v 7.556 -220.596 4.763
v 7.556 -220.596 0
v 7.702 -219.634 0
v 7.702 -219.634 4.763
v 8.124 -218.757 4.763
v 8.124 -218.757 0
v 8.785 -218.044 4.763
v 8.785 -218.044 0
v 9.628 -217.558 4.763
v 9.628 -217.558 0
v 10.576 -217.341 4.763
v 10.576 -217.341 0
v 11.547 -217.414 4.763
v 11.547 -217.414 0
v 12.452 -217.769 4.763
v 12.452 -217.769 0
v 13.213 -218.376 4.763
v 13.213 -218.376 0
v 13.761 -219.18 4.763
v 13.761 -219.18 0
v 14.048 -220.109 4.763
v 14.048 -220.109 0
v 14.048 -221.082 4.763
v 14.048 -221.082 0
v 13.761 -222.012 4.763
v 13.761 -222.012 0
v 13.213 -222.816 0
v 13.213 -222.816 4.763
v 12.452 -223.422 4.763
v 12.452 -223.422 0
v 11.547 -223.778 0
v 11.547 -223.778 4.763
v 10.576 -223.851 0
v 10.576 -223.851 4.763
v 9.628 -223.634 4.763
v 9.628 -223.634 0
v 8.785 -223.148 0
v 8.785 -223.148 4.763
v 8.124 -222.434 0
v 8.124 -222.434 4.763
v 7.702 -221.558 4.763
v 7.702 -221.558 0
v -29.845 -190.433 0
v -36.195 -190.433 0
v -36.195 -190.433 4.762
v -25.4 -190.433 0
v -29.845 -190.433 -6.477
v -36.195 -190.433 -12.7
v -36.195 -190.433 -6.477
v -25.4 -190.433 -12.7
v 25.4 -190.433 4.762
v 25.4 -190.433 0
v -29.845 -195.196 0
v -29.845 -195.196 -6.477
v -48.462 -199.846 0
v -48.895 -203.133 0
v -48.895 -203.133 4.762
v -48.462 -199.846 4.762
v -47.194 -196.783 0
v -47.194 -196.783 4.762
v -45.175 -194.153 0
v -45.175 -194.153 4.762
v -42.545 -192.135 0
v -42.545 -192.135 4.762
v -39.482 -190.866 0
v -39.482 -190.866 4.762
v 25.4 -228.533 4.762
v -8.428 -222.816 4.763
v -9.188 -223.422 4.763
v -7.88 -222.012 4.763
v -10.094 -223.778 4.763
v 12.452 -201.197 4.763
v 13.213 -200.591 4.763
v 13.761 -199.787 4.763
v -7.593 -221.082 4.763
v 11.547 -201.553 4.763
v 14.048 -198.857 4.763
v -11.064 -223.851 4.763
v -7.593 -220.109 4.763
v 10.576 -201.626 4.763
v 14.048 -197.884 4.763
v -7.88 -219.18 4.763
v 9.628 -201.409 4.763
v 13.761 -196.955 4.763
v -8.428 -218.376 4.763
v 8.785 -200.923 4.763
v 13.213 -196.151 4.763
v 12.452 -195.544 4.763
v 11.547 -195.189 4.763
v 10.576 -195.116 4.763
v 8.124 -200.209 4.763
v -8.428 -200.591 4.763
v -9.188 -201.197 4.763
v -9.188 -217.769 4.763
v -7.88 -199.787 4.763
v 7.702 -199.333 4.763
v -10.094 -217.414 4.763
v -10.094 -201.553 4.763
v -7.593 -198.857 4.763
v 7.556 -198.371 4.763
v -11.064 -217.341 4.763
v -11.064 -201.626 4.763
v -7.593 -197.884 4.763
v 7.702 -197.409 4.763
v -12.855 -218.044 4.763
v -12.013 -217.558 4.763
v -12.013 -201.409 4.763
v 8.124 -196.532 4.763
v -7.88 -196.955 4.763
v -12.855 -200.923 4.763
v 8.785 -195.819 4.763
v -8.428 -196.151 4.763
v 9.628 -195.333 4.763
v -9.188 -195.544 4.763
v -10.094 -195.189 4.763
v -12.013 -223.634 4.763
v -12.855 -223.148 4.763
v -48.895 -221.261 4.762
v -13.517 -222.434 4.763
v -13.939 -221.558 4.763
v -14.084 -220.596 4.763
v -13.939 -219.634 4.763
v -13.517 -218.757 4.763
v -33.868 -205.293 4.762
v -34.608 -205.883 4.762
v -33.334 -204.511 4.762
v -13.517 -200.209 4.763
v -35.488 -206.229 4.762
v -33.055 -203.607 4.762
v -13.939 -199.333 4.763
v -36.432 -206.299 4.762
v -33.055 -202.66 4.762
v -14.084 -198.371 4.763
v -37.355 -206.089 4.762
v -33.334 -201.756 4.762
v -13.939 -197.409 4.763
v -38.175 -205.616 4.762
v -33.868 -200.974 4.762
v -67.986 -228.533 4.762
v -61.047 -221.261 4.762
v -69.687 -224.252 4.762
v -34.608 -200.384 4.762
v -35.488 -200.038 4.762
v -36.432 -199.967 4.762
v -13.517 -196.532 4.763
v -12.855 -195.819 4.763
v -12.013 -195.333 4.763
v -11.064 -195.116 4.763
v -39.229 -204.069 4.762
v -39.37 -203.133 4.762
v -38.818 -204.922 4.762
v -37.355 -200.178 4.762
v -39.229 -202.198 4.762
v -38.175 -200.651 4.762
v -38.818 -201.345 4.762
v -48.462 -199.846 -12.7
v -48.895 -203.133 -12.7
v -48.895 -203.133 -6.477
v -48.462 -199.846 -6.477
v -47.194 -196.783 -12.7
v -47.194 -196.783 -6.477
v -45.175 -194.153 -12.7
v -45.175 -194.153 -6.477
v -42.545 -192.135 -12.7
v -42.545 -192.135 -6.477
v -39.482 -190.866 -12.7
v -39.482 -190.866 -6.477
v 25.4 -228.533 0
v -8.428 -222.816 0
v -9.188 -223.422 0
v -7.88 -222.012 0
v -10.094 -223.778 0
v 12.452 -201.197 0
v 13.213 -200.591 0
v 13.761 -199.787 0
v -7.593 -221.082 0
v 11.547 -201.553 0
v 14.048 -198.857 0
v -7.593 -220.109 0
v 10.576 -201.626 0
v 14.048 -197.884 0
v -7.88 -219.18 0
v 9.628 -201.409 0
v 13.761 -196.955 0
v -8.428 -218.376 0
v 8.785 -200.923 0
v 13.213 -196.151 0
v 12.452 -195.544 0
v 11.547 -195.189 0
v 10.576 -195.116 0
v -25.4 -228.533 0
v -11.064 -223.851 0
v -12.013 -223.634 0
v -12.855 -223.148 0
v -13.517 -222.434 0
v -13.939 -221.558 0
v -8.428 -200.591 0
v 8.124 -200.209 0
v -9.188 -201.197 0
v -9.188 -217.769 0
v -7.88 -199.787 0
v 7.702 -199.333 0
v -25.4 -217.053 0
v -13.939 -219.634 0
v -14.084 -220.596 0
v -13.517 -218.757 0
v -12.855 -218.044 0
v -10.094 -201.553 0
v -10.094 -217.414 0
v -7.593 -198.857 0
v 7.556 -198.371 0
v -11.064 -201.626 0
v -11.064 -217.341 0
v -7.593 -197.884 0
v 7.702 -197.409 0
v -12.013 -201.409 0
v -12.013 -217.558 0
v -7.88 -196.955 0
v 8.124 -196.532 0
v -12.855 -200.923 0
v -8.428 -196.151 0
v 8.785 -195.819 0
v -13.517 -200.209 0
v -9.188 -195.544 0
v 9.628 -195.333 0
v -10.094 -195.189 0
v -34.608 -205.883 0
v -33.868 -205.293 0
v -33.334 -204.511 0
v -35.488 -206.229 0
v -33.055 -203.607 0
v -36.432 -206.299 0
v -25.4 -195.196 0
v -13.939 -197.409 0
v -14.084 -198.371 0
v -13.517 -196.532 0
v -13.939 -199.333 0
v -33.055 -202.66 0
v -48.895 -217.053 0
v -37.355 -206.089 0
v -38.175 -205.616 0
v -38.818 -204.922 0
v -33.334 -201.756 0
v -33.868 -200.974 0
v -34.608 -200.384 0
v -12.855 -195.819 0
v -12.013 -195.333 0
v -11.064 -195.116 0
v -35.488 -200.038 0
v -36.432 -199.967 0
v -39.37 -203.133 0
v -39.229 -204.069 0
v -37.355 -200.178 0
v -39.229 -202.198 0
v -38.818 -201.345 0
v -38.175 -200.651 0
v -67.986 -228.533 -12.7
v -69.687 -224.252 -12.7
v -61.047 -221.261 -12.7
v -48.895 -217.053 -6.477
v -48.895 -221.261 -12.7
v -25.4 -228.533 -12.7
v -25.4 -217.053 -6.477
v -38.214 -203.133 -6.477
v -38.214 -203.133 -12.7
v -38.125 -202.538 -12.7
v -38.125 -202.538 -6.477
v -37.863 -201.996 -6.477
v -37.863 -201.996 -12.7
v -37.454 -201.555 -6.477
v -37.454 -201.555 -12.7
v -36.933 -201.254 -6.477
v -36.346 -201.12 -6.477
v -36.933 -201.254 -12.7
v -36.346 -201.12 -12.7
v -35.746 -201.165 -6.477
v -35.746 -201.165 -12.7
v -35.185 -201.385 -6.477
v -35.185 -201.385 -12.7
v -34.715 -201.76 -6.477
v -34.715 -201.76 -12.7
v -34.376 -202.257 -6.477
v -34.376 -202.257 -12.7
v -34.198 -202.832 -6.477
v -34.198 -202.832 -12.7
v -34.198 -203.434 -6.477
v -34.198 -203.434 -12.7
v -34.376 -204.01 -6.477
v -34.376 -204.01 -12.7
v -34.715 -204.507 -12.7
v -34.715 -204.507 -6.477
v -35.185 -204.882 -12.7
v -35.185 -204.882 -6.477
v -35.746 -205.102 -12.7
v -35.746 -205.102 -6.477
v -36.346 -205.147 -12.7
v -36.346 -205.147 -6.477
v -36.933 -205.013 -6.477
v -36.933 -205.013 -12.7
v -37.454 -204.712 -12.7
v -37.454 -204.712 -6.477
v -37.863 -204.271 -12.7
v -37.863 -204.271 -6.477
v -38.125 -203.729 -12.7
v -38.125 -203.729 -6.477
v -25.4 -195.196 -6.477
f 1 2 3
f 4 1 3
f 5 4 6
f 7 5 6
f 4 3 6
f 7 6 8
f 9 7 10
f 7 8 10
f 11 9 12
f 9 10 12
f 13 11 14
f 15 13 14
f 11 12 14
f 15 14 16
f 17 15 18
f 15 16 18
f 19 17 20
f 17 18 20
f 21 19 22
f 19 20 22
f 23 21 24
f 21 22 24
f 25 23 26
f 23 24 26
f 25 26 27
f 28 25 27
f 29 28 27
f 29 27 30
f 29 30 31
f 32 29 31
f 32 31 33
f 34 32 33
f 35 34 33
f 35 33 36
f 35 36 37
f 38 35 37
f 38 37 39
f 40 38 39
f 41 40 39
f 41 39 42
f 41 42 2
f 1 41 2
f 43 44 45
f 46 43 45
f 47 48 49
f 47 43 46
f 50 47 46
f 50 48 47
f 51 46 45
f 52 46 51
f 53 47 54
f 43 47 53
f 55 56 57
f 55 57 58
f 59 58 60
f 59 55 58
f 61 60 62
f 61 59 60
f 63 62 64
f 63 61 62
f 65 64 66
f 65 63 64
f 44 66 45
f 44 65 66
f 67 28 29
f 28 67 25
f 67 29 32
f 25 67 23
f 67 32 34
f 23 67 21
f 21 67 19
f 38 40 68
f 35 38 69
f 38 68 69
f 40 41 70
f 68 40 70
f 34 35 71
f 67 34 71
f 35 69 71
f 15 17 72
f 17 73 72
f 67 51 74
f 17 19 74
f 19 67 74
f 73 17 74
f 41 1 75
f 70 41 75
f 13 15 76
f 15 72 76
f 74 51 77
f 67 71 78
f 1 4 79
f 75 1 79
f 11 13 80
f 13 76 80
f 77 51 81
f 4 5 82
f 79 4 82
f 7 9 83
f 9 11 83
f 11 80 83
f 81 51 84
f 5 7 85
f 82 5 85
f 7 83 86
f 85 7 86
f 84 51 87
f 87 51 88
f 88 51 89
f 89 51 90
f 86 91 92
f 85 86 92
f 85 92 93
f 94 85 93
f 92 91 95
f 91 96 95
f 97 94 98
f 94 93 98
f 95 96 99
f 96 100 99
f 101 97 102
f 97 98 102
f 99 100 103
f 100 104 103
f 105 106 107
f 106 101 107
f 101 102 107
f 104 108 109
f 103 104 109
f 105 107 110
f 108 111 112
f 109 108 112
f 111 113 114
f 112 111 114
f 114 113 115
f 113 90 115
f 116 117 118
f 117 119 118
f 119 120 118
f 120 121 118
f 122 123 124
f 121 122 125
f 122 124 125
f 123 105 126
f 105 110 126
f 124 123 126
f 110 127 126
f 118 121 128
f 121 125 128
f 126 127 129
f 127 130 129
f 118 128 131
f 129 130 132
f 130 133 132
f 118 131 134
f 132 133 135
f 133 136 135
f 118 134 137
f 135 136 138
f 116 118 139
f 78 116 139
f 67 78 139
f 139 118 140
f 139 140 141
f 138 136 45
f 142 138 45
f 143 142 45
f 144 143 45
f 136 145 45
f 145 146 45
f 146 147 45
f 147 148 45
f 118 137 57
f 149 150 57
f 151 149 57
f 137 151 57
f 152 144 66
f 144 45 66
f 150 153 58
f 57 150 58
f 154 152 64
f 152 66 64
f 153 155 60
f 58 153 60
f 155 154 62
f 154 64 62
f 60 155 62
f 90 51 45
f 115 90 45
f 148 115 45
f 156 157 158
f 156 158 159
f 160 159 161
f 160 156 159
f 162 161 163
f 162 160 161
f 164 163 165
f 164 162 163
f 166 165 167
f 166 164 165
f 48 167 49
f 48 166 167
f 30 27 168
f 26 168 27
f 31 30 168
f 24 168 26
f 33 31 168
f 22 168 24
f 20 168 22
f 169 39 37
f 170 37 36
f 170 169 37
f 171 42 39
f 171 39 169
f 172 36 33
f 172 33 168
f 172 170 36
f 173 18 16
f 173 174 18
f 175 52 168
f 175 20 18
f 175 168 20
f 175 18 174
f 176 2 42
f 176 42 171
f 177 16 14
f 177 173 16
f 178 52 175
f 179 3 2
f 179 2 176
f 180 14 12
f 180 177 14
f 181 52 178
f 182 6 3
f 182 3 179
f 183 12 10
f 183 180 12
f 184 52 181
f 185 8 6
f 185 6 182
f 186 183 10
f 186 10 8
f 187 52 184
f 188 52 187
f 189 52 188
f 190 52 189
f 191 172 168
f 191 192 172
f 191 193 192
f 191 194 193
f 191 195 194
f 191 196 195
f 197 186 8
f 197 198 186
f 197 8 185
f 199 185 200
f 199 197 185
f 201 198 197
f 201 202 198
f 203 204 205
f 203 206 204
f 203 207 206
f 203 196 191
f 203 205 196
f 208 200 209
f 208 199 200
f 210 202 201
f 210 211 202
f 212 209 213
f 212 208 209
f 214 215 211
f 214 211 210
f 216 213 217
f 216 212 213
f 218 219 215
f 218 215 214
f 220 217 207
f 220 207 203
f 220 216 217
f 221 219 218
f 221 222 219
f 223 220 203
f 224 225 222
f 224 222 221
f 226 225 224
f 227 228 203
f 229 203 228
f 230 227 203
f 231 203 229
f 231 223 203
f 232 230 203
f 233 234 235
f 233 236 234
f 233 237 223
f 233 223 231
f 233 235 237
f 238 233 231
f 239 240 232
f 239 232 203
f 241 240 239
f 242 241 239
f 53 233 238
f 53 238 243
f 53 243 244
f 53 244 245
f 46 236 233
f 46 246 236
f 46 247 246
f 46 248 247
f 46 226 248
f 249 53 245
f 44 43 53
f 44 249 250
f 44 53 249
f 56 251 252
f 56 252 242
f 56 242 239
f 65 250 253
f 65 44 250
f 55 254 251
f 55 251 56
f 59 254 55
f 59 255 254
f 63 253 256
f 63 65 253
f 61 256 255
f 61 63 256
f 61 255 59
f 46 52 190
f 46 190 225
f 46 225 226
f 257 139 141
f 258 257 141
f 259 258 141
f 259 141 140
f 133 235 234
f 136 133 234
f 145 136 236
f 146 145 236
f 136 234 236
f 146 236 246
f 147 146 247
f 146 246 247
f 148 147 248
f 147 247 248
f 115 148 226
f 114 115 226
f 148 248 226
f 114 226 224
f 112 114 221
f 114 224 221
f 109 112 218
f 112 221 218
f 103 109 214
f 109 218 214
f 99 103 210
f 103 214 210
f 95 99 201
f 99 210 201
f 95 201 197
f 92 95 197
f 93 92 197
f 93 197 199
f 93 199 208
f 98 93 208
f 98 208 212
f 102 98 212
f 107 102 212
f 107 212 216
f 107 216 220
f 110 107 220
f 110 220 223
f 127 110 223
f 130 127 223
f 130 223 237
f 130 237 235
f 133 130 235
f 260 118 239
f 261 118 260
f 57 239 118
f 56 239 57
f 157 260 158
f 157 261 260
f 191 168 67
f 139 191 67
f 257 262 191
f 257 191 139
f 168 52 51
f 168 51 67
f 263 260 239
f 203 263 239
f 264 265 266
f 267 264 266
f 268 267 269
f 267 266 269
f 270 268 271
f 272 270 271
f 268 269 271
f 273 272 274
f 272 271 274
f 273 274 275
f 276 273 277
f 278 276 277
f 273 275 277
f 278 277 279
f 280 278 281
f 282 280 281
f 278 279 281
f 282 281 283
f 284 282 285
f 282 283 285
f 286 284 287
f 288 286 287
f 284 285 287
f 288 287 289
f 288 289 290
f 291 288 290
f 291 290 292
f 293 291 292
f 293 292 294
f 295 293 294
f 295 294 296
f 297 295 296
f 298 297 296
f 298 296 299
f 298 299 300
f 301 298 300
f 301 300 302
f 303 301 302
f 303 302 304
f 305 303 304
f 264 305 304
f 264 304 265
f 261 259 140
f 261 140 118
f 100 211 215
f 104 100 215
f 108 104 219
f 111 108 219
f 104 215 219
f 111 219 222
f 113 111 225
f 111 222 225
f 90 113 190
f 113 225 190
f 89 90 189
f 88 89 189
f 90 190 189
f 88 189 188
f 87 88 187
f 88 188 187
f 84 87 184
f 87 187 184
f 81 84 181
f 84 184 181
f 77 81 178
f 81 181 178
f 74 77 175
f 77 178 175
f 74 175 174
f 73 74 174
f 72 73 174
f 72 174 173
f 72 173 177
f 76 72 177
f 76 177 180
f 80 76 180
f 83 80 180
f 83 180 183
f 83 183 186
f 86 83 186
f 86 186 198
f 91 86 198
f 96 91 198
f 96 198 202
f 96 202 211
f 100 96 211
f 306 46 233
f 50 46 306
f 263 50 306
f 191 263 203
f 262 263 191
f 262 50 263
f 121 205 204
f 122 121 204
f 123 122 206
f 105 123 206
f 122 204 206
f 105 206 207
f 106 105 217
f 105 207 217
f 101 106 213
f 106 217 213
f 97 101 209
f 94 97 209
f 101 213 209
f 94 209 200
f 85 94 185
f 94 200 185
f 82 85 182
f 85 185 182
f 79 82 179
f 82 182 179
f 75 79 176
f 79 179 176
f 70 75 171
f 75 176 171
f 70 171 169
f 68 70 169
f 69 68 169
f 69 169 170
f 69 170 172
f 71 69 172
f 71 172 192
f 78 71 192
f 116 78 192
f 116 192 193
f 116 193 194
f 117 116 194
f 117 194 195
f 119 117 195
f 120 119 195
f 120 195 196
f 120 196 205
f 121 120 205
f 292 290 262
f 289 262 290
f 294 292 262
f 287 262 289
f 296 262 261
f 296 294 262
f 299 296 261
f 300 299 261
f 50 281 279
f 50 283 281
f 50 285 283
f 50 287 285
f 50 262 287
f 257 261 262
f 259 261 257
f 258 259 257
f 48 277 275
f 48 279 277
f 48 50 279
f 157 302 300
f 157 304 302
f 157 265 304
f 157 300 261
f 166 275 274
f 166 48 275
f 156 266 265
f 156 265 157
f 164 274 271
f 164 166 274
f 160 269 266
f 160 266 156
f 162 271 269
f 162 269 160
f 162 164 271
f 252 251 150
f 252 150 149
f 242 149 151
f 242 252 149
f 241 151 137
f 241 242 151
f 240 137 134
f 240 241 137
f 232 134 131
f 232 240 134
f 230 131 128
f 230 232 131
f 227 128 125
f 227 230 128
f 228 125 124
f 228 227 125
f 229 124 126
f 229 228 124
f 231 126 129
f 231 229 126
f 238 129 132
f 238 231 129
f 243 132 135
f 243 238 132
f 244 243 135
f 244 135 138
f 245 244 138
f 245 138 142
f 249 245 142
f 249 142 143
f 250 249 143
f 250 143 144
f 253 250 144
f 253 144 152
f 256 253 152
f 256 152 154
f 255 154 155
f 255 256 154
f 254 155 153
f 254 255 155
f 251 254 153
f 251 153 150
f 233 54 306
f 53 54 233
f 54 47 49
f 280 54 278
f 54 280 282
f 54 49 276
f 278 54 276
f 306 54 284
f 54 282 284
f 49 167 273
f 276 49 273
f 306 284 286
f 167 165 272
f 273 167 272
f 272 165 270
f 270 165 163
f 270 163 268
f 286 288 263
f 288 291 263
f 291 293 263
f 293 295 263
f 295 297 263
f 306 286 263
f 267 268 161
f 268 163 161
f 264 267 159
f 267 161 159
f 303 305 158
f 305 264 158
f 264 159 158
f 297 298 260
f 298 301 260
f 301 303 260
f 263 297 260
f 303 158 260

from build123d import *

# Parameters (mm, degrees)
SKETCH2_R                  = 3.175
BOSS_EXTRUDE1_DEPTH        = 4.7625
BOSS_EXTRUDE2_START        = 12.7
BOSS_EXTRUDE2_DEPTH        = 12.7
SKETCH12_W                 = 6.477
SKETCH12_H                 = 21.856650617
CUT_EXTRUDE1_DEPTH         = 24.13
SKETCH12_3_W               = 6.477
SKETCH12_3_H               = 4.7625
CUT_EXTRUDE2_DEPTH         = 19.05
TAP_DRILL_FOR_10_32_TAP1_D = 4.0386
F_1_4_CLEARANCE_HOLE1_D    = 6.5278


with BuildPart() as part:
    # Sketch2 → Boss-Extrude1 (new body)
    with BuildSketch(Plane.XY):
        with BuildLine():
            Line((-67.986186343, -228.533359856), (-69.686856366, -224.252380141))
            Line((-69.686856366, -224.252380141), (-61.0470258, -221.260552334))
            Line((-61.0470258, -221.260552334), (-48.895, -221.260552334))
            Line((-48.895, -221.260552334), (-48.895, -203.133359856))
            ThreePointArc((-48.895, -203.133359856), (-45.175256121, -194.153103735), (-36.195, -190.433359856))
            Line((-36.195, -190.433359856), (25.4, -190.433359856))
            Line((25.4, -190.433359856), (25.4, -228.533359856))
            Line((25.4, -228.533359856), (-67.986186343, -228.533359856))
        make_face()
        with Locations((-36.195, -203.133359856)):
            Circle(SKETCH2_R, mode=Mode.SUBTRACT)
    extrude(amount=BOSS_EXTRUDE1_DEPTH)

    # Sketch11 → Boss-Extrude2 (add)
    with BuildSketch(Plane(origin=(0, 0, 0), x_dir=(-1, 0, 0), z_dir=(0, 0, -1)).offset(BOSS_EXTRUDE2_START)):
        with BuildLine():
            Line((25.4, -190.433359856), (25.4, -228.533359856))
            Line((25.4, -228.533359856), (67.986186343, -228.533359856))
            Line((67.986186343, -228.533359856), (69.686856366, -224.252380141))
            Line((69.686856366, -224.252380141), (61.0470258, -221.260552334))
            Line((61.0470258, -221.260552334), (48.895, -221.260552334))
            Line((48.895, -221.260552334), (48.895, -203.133359856))
            ThreePointArc((48.895, -203.133359856), (45.175256121, -194.153103735), (36.195, -190.433359856))
            Line((36.195, -190.433359856), (25.4, -190.433359856))
        make_face()
    extrude(amount=-BOSS_EXTRUDE2_DEPTH)

    # Sketch12 → Cut-Extrude1 (cut)
    with BuildSketch(Plane.ZY.offset(48.895)):
        with Locations((-3.2385, -206.124185165)):
            Rectangle(SKETCH12_W, SKETCH12_H)
    extrude(amount=-CUT_EXTRUDE1_DEPTH, mode=Mode.SUBTRACT)

    # Sketch12<3> → Cut-Extrude2 (cut)
    with BuildSketch(Plane.ZY.offset(48.895)):
        with Locations((-3.2385, -192.814609856)):
            Rectangle(SKETCH12_3_W, SKETCH12_3_H)
    extrude(amount=-CUT_EXTRUDE2_DEPTH, mode=Mode.SUBTRACT)

    # Tap Drill for #10-32 Tap1 (through all)
    with Locations(Plane.XY.offset(-6.477)):
        with Locations((-36.195, -203.133359856)):
            Hole(TAP_DRILL_FOR_10_32_TAP1_D / 2)

    # 1/4 Clearance Hole1 (through all)
    with Locations(Plane.XY.offset(4.7625)):
        with Locations((-10.8204, -198.370859856), (-10.8204, -220.595859856), (10.8204, -220.595859856), (10.8204, -198.370859856)):
            Hole(F_1_4_CLEARANCE_HOLE1_D / 2)


solid = part.part
